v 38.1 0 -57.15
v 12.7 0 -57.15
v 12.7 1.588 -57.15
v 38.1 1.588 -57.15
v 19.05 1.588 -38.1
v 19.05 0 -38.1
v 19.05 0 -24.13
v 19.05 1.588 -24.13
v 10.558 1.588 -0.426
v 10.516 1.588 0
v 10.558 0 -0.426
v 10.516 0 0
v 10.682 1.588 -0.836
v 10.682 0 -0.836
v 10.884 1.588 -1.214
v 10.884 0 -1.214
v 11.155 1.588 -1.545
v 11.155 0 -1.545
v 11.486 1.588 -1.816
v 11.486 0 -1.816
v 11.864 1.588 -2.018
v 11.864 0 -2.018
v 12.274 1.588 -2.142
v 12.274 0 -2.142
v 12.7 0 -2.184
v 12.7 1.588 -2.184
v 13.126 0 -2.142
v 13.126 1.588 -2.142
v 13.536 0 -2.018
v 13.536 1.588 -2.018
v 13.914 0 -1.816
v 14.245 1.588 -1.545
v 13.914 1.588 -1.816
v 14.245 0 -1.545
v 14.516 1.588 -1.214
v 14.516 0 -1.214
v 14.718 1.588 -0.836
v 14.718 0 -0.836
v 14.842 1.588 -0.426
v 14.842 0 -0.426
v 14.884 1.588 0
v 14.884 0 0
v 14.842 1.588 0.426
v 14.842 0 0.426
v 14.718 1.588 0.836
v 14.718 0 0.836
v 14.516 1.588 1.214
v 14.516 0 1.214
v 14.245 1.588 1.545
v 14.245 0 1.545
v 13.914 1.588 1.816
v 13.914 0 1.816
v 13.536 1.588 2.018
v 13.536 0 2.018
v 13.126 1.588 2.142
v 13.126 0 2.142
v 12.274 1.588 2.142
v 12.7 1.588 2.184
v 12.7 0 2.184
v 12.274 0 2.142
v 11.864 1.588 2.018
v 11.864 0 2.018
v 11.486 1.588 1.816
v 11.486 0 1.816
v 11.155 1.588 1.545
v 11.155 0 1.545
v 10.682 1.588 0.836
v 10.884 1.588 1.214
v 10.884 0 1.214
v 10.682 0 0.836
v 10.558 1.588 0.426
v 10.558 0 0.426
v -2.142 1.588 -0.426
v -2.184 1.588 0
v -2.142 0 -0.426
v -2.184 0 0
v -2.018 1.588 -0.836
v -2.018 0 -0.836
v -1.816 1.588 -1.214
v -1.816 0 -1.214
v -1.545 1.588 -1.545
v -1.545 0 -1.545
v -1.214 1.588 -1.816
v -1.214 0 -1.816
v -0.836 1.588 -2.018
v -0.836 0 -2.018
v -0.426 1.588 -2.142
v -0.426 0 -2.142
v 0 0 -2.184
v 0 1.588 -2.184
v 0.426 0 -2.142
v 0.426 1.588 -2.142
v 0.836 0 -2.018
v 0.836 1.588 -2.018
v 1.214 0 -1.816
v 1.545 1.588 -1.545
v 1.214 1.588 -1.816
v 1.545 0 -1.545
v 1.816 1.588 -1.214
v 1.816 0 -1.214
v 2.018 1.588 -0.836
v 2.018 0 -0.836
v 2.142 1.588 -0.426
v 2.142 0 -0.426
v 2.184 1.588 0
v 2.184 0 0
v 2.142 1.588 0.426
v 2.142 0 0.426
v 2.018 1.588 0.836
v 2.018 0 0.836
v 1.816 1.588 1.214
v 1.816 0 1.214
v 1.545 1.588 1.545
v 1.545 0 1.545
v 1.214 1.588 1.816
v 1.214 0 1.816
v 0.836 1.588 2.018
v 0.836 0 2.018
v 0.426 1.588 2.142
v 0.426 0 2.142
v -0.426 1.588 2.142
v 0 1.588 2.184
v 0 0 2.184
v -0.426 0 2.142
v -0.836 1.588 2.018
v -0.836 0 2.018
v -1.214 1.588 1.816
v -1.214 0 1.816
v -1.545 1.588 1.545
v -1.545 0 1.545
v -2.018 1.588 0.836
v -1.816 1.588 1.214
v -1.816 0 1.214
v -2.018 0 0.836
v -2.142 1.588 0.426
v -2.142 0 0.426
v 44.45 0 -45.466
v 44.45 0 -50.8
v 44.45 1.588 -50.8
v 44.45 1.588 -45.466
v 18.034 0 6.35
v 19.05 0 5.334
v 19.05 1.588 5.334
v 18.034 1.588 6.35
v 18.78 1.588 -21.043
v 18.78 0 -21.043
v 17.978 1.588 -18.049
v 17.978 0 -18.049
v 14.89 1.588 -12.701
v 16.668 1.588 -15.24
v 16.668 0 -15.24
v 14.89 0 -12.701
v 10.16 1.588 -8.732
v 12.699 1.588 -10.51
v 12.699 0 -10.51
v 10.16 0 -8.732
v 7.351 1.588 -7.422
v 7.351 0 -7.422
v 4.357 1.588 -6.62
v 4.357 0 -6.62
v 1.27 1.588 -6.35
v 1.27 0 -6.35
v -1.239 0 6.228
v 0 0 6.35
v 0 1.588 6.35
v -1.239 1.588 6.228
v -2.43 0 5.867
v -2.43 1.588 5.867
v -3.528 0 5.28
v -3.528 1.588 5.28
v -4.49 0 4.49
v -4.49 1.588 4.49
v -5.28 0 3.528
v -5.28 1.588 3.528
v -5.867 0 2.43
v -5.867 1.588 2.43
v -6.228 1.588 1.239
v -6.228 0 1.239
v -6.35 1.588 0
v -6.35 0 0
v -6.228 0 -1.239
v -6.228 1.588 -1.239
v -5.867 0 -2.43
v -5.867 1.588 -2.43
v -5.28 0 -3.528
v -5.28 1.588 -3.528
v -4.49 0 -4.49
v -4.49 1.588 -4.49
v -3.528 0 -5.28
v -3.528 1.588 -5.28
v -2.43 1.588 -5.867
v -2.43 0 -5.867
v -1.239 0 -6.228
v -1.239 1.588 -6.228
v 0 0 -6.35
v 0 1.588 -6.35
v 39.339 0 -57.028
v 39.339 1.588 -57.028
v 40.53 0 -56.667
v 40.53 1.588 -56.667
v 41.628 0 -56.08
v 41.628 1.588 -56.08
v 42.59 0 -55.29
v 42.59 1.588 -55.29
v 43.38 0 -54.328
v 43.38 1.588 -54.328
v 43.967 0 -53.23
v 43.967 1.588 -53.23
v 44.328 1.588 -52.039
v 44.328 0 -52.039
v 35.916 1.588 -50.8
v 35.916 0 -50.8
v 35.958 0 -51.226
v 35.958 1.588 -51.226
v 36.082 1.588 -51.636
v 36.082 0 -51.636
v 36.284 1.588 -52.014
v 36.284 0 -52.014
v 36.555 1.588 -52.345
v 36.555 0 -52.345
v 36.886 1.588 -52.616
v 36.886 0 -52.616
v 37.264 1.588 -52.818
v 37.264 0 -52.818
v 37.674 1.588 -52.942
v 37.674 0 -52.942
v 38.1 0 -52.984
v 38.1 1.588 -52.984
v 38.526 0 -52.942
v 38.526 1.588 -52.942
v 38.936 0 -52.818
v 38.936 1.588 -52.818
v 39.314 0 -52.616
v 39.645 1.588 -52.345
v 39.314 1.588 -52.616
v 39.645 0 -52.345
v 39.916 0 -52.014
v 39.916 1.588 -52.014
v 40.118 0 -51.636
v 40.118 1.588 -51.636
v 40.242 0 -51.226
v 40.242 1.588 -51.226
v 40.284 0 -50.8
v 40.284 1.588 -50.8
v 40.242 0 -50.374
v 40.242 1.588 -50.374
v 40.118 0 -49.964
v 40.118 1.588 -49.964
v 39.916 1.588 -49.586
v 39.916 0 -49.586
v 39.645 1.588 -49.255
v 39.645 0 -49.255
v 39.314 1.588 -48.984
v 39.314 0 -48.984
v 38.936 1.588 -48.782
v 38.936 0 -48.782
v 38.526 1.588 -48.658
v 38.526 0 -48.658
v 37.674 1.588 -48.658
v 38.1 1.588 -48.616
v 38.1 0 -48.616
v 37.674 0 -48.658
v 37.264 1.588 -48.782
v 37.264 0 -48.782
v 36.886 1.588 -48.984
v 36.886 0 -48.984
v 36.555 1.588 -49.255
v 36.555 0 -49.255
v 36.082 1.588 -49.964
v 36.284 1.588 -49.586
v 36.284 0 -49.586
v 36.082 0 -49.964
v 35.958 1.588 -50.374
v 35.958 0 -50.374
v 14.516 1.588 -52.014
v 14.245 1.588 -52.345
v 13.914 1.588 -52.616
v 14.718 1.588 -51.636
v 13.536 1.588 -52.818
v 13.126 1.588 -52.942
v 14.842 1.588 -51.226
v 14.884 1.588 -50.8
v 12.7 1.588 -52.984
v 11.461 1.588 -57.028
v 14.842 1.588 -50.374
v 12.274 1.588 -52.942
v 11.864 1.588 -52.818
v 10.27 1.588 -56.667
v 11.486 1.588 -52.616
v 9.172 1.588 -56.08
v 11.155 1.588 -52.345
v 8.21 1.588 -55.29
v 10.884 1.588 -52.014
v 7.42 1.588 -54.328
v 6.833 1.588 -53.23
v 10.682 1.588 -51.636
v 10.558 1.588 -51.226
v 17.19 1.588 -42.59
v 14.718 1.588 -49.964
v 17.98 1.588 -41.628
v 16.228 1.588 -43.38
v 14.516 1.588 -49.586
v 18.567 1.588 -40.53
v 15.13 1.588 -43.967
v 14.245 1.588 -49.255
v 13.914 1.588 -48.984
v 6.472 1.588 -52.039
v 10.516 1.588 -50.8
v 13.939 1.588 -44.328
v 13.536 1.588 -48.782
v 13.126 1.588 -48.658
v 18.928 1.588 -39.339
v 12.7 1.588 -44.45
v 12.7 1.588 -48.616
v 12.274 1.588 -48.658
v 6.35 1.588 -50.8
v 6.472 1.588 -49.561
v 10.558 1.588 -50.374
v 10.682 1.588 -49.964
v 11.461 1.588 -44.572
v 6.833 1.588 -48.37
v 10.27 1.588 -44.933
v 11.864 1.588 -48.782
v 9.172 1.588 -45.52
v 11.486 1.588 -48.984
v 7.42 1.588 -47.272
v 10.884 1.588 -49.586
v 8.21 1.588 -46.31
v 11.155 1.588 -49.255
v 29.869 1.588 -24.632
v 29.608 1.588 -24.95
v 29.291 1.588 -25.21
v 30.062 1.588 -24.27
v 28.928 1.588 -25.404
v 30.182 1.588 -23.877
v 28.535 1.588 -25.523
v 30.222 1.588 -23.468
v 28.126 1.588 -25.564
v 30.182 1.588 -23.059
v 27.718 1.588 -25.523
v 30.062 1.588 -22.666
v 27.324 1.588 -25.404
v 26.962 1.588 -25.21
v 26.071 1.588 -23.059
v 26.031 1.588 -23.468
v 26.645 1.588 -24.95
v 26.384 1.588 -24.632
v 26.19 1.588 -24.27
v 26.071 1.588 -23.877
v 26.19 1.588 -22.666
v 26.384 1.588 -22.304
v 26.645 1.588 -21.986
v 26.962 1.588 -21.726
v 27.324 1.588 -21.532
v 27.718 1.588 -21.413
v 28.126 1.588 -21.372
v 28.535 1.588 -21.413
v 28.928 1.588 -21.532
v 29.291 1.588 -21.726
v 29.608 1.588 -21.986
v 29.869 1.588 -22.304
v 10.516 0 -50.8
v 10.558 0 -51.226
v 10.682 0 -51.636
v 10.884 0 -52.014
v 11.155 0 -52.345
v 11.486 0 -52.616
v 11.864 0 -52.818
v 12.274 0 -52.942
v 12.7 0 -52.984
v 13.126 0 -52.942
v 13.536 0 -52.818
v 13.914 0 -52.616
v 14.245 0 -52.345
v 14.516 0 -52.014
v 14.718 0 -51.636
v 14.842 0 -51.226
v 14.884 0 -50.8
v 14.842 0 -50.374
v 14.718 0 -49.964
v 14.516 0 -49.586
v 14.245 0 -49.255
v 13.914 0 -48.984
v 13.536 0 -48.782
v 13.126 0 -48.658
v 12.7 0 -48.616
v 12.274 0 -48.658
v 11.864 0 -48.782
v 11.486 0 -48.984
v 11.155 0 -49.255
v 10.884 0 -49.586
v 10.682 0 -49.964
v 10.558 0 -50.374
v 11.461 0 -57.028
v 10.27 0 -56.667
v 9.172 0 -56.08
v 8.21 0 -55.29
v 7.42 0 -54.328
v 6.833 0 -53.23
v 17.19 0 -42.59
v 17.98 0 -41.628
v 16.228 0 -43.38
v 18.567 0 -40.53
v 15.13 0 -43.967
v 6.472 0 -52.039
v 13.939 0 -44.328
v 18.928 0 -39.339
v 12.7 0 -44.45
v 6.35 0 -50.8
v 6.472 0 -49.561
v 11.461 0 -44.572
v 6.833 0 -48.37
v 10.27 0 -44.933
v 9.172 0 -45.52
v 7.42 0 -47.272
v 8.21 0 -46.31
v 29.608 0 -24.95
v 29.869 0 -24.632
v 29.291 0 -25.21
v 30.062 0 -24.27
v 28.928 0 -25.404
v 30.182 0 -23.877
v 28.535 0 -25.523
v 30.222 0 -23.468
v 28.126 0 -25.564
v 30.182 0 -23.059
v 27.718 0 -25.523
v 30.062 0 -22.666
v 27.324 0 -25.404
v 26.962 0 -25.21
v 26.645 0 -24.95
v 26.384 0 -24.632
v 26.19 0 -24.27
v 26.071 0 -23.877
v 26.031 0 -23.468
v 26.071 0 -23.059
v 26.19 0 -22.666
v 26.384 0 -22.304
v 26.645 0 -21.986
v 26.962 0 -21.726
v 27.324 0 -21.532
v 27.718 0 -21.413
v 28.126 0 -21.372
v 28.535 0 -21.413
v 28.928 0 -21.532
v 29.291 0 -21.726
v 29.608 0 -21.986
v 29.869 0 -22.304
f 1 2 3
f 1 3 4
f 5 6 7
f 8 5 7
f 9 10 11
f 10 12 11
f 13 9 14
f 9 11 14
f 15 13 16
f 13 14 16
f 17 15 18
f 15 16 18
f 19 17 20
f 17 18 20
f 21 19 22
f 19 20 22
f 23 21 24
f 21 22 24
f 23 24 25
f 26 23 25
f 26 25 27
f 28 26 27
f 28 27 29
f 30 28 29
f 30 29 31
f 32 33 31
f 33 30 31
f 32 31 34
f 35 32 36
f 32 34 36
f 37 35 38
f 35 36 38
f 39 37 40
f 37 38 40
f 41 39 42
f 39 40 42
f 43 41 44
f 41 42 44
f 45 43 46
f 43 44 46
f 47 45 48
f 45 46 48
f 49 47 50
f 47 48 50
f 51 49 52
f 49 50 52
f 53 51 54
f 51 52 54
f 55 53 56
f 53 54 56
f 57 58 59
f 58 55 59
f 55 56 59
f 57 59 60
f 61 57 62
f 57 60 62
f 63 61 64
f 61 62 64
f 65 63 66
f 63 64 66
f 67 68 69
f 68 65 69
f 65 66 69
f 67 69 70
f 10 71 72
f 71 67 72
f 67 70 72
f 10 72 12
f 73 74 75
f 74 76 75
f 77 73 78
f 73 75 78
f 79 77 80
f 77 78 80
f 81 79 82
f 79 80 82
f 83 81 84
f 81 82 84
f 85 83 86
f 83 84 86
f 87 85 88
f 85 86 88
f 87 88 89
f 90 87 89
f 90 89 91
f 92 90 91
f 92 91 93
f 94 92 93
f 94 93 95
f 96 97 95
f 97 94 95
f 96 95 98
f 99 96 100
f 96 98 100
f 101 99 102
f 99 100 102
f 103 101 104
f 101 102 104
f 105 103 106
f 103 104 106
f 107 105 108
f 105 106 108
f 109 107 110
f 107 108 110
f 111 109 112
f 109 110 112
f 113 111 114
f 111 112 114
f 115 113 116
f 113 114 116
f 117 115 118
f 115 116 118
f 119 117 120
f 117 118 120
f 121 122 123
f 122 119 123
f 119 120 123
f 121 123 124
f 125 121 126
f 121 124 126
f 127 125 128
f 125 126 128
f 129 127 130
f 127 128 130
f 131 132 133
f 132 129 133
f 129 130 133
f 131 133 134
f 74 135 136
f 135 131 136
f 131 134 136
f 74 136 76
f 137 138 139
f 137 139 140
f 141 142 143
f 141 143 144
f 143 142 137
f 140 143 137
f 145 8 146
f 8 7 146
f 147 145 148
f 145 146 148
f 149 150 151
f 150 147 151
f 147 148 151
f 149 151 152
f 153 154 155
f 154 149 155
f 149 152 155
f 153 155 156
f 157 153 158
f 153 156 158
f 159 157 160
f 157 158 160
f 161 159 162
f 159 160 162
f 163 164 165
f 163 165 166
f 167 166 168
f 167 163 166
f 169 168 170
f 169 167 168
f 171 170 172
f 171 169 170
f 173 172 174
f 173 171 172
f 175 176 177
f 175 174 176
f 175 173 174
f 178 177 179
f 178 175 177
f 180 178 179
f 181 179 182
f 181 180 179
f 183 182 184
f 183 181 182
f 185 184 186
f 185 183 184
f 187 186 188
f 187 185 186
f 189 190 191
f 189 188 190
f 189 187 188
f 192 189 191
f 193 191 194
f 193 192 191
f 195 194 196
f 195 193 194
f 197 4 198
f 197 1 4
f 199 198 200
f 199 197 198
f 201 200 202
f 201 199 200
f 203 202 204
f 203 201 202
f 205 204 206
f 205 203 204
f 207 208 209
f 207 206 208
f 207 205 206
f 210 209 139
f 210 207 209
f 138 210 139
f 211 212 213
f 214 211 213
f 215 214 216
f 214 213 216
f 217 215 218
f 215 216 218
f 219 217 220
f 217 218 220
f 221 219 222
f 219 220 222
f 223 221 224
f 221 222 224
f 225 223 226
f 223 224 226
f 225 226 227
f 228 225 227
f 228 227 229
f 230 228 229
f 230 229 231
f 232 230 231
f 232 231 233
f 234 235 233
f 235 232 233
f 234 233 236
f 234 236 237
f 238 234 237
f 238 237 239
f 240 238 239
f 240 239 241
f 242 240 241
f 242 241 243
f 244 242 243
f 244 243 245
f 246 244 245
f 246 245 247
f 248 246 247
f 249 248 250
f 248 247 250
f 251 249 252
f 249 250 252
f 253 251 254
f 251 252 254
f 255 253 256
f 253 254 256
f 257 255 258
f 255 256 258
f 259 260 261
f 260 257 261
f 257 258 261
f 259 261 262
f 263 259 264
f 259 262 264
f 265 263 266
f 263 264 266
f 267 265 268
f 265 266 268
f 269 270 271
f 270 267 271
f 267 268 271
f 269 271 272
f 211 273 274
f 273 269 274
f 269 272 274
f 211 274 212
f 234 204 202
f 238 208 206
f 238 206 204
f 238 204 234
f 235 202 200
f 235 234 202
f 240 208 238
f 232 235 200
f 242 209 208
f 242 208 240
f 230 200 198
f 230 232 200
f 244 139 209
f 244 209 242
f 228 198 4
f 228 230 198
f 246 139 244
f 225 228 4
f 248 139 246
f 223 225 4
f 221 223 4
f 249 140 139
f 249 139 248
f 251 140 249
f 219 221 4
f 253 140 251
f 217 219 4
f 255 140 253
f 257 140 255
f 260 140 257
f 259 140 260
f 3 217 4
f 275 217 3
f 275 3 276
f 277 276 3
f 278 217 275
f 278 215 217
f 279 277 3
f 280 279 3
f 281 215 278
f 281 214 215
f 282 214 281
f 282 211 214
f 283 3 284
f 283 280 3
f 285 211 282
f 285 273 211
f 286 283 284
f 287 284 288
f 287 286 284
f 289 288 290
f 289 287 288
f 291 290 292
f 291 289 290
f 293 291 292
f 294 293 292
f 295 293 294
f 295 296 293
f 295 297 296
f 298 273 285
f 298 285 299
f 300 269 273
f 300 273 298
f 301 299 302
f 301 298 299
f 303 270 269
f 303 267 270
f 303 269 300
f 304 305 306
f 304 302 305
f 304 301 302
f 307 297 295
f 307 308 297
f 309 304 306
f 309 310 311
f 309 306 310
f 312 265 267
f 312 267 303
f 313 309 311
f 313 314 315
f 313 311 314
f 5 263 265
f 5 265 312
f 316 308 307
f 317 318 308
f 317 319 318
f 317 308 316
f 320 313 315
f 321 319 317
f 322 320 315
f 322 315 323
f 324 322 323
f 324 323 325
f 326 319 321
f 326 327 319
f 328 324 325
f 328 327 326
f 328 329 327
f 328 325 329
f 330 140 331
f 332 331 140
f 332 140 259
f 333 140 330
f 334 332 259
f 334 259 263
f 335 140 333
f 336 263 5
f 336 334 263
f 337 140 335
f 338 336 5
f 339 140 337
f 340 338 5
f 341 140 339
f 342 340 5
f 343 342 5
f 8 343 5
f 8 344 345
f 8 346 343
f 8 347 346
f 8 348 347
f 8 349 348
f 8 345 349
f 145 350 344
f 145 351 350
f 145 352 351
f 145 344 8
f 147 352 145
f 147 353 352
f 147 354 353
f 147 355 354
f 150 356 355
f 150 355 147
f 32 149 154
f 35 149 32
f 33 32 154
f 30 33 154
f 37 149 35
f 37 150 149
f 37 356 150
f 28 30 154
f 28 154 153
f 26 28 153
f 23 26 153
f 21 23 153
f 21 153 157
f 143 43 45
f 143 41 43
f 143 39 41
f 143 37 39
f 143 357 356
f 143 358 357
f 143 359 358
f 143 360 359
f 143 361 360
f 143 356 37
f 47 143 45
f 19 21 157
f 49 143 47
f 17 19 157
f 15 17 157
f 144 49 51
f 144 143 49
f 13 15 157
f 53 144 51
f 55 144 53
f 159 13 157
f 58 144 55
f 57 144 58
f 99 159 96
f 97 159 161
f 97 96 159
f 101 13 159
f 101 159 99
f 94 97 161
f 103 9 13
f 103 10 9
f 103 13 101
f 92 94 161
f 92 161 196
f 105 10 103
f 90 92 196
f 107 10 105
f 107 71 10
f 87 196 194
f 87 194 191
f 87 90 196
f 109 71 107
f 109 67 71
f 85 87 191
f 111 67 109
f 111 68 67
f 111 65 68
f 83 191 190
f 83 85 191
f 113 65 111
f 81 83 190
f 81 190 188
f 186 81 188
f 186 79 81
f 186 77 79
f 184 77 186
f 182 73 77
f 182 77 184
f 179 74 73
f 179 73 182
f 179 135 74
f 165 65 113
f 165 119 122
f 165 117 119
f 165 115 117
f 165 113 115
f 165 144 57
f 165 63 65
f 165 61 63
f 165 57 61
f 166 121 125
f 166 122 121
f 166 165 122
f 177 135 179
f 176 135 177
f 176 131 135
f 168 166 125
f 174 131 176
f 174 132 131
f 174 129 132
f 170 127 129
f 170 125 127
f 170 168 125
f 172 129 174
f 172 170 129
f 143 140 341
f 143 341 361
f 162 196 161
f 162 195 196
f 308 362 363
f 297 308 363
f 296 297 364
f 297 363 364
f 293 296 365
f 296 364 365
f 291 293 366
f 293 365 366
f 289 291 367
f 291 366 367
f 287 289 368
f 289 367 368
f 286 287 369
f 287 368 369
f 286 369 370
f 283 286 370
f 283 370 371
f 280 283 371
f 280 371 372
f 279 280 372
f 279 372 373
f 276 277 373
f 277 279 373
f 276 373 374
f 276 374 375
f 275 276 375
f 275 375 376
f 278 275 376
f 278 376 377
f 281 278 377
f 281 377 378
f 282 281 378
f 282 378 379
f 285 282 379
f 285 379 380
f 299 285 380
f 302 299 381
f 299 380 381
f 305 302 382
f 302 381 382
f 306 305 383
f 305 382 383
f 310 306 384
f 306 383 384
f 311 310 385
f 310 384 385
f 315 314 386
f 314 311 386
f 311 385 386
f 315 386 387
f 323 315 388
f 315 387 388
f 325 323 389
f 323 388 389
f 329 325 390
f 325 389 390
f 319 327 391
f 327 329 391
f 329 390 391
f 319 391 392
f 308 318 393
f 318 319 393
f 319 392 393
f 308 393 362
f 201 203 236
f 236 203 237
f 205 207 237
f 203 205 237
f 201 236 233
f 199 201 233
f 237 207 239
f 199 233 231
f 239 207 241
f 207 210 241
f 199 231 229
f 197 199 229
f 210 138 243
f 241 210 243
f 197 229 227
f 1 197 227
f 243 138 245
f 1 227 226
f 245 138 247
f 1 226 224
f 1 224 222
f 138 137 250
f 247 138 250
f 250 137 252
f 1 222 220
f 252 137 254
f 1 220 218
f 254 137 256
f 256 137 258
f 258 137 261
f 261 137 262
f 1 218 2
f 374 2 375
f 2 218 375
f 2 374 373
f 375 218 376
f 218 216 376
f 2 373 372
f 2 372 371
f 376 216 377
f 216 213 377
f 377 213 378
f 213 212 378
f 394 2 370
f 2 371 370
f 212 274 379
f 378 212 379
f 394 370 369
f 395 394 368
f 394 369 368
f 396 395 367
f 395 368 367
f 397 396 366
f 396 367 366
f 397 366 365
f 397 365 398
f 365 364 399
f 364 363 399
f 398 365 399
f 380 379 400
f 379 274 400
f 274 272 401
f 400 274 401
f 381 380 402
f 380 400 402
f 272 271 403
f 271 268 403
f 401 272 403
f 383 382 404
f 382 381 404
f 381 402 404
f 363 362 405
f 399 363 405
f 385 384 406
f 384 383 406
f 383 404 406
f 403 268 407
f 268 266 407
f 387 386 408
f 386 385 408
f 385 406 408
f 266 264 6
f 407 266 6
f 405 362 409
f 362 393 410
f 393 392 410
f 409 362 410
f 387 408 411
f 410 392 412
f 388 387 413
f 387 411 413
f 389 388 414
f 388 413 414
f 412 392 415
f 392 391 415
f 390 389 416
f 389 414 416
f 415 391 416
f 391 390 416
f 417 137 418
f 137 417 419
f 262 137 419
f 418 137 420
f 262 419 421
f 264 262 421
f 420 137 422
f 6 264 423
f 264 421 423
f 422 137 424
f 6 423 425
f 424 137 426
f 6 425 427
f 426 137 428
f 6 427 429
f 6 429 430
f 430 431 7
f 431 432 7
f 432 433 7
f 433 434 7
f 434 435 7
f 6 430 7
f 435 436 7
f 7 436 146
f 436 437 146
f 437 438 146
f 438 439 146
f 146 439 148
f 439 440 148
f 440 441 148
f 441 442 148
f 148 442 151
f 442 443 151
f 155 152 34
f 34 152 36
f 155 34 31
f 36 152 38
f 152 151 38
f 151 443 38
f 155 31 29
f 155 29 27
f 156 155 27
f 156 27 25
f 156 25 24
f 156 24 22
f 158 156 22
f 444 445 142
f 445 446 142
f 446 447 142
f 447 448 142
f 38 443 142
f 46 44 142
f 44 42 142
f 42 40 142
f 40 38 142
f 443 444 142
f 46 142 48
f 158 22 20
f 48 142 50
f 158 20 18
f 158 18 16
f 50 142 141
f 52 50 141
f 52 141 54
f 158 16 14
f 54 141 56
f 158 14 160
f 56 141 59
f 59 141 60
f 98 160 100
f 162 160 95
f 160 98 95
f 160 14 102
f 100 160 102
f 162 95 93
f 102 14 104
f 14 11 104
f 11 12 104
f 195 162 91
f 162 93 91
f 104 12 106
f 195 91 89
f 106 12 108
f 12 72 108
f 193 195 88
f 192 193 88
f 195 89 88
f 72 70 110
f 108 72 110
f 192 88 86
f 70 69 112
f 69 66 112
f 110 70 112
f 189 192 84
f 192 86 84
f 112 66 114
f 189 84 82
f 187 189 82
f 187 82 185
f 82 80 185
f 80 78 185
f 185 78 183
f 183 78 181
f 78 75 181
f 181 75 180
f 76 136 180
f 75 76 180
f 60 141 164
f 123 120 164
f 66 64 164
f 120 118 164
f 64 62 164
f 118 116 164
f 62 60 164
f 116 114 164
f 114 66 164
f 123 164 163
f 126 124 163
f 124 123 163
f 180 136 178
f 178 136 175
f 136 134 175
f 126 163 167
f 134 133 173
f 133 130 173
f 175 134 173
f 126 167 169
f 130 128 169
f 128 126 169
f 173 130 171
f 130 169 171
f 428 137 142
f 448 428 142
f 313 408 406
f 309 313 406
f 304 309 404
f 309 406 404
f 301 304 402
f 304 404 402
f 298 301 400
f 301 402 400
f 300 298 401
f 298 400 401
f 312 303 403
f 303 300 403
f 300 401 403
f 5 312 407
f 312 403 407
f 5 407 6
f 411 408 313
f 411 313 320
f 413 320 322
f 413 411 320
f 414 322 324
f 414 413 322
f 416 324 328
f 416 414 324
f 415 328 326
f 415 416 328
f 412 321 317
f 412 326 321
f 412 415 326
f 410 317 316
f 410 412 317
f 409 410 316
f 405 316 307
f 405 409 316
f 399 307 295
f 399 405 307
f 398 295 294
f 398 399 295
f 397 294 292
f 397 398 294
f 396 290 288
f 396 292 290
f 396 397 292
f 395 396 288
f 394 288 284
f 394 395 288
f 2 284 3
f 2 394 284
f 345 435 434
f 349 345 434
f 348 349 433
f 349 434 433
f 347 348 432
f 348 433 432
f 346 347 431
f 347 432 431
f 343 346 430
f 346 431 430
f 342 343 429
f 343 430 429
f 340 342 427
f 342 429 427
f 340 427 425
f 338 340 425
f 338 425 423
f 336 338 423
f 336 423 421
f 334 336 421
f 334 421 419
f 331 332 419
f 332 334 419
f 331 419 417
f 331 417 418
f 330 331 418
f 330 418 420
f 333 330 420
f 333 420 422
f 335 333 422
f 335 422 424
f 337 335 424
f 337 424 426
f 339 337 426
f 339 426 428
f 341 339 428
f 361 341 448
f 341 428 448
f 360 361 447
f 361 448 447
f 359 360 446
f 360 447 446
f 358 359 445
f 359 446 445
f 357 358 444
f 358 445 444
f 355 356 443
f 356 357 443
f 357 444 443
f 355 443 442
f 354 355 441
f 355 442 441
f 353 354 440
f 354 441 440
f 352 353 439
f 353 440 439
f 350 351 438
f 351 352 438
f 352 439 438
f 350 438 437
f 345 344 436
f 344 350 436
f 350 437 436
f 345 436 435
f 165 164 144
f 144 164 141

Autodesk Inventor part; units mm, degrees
ref_plane "YZ Plane" through (0, 0, 0) normal (1, 0, 0) x (0, 1, 0)
ref_plane "XZ Plane" through (0, 0, 0) normal (0, 1, 0) x (-1, 0, 0)
ref_plane "XY Plane" through (0, 0, 0) normal (0, 0, 1) x (1, 0, 0)
sketch "main" plane through (0, 0, 0) normal (0, 0, 1) x (1, 0, 0)
  circle A0 centre (11.2296, 26.3602) radius 2.1844
  line L0 (23.9296, 20.0102) -> (22.6596, 20.0102)
  line L1 (4.8796, 31.6942) -> (5.8956, 32.7102)
  circle A1 centre (23.9296, 26.3602) radius 2.1844
  line L2 (23.9296, 32.7102) -> (5.8956, 32.7102)
  arc A2 (23.9296, 20.0102) -> (23.9296, 32.7102) centre (23.9296, 26.3602) ccw
  circle A3 centre (-14.1704, -24.4398) radius 2.1844
  circle A4 centre (11.2296, -24.4398) radius 2.1844
  arc A5 (22.6596, 20.0102) -> (4.8796, 2.2302) centre (22.6596, 2.2302) ccw
  line L3 (4.8796, -11.7398) -> (4.8796, 2.2302)
  arc A6 (4.8796, -11.7398) -> (11.2296, -18.0898) centre (11.2296, -11.7398) ccw
  line L4 (4.8796, 31.6942) -> (-20.5204, -19.1058)
  arc A7 (11.2296, -30.7898) -> (11.2296, -18.0898) centre (11.2296, -24.4398) ccw
  line L5 (11.2296, -30.7898) -> (-14.1704, -30.7898)
  line L6 (-20.5204, -24.4398) -> (-20.5204, -19.1058)
  arc A8 (-20.5204, -24.4398) -> (-14.1704, -30.7898) centre (-14.1704, -24.4398) ccw
  circle A9 centre (-4.1968, 2.8922) radius 2.0955
  point P0 (6.0044, -0.2269)
  dimension "d0" = 12.7
  dimension "d1" = 17.78
  dimension "d2" = 6.35
  dimension "d3" = 1.27
  dimension "d4" = 6.35
  dimension "d8" = 4.191
sketch "Sketch1" plane through (0, 0, 0) normal (0, 1, 0) x (-1, 0, 0)
  circle A0 centre (-12.7, 0) radius 2.1844
  line L0 (0, -6.35) -> (-1.27, -6.35)
  line L1 (-19.05, 5.334) -> (-18.034, 6.35)
  circle A1 centre (0, 0) radius 2.1844
  line L2 (0, 6.35) -> (-18.034, 6.35)
  arc A2 (0, -6.35) -> (0, 6.35) centre (0, 0) ccw
  circle A3 centre (-38.1, -50.8) radius 2.1844
  circle A4 centre (-12.7, -50.8) radius 2.1844
  arc A5 (-1.27, -6.35) -> (-19.05, -24.13) centre (-1.27, -24.13) ccw
  line L3 (-19.05, -38.1) -> (-19.05, -24.13)
  arc A6 (-19.05, -38.1) -> (-12.7, -44.45) centre (-12.7, -38.1) ccw
  line L4 (-19.05, 5.334) -> (-44.45, -45.466)
  arc A7 (-12.7, -57.15) -> (-12.7, -44.45) centre (-12.7, -50.8) ccw
  line L5 (-12.7, -57.15) -> (-38.1, -57.15)
  line L6 (-44.45, -50.8) -> (-44.45, -45.466)
  arc A8 (-44.45, -50.8) -> (-38.1, -57.15) centre (-38.1, -50.8) ccw
  circle A9 centre (-28.1264, -23.468) radius 2.0955
extrude "Extrusion1" add sketch "Sketch1" along normal blind 1.5875
properties part number "Front Gusset" material "Acetal Resin, White"
